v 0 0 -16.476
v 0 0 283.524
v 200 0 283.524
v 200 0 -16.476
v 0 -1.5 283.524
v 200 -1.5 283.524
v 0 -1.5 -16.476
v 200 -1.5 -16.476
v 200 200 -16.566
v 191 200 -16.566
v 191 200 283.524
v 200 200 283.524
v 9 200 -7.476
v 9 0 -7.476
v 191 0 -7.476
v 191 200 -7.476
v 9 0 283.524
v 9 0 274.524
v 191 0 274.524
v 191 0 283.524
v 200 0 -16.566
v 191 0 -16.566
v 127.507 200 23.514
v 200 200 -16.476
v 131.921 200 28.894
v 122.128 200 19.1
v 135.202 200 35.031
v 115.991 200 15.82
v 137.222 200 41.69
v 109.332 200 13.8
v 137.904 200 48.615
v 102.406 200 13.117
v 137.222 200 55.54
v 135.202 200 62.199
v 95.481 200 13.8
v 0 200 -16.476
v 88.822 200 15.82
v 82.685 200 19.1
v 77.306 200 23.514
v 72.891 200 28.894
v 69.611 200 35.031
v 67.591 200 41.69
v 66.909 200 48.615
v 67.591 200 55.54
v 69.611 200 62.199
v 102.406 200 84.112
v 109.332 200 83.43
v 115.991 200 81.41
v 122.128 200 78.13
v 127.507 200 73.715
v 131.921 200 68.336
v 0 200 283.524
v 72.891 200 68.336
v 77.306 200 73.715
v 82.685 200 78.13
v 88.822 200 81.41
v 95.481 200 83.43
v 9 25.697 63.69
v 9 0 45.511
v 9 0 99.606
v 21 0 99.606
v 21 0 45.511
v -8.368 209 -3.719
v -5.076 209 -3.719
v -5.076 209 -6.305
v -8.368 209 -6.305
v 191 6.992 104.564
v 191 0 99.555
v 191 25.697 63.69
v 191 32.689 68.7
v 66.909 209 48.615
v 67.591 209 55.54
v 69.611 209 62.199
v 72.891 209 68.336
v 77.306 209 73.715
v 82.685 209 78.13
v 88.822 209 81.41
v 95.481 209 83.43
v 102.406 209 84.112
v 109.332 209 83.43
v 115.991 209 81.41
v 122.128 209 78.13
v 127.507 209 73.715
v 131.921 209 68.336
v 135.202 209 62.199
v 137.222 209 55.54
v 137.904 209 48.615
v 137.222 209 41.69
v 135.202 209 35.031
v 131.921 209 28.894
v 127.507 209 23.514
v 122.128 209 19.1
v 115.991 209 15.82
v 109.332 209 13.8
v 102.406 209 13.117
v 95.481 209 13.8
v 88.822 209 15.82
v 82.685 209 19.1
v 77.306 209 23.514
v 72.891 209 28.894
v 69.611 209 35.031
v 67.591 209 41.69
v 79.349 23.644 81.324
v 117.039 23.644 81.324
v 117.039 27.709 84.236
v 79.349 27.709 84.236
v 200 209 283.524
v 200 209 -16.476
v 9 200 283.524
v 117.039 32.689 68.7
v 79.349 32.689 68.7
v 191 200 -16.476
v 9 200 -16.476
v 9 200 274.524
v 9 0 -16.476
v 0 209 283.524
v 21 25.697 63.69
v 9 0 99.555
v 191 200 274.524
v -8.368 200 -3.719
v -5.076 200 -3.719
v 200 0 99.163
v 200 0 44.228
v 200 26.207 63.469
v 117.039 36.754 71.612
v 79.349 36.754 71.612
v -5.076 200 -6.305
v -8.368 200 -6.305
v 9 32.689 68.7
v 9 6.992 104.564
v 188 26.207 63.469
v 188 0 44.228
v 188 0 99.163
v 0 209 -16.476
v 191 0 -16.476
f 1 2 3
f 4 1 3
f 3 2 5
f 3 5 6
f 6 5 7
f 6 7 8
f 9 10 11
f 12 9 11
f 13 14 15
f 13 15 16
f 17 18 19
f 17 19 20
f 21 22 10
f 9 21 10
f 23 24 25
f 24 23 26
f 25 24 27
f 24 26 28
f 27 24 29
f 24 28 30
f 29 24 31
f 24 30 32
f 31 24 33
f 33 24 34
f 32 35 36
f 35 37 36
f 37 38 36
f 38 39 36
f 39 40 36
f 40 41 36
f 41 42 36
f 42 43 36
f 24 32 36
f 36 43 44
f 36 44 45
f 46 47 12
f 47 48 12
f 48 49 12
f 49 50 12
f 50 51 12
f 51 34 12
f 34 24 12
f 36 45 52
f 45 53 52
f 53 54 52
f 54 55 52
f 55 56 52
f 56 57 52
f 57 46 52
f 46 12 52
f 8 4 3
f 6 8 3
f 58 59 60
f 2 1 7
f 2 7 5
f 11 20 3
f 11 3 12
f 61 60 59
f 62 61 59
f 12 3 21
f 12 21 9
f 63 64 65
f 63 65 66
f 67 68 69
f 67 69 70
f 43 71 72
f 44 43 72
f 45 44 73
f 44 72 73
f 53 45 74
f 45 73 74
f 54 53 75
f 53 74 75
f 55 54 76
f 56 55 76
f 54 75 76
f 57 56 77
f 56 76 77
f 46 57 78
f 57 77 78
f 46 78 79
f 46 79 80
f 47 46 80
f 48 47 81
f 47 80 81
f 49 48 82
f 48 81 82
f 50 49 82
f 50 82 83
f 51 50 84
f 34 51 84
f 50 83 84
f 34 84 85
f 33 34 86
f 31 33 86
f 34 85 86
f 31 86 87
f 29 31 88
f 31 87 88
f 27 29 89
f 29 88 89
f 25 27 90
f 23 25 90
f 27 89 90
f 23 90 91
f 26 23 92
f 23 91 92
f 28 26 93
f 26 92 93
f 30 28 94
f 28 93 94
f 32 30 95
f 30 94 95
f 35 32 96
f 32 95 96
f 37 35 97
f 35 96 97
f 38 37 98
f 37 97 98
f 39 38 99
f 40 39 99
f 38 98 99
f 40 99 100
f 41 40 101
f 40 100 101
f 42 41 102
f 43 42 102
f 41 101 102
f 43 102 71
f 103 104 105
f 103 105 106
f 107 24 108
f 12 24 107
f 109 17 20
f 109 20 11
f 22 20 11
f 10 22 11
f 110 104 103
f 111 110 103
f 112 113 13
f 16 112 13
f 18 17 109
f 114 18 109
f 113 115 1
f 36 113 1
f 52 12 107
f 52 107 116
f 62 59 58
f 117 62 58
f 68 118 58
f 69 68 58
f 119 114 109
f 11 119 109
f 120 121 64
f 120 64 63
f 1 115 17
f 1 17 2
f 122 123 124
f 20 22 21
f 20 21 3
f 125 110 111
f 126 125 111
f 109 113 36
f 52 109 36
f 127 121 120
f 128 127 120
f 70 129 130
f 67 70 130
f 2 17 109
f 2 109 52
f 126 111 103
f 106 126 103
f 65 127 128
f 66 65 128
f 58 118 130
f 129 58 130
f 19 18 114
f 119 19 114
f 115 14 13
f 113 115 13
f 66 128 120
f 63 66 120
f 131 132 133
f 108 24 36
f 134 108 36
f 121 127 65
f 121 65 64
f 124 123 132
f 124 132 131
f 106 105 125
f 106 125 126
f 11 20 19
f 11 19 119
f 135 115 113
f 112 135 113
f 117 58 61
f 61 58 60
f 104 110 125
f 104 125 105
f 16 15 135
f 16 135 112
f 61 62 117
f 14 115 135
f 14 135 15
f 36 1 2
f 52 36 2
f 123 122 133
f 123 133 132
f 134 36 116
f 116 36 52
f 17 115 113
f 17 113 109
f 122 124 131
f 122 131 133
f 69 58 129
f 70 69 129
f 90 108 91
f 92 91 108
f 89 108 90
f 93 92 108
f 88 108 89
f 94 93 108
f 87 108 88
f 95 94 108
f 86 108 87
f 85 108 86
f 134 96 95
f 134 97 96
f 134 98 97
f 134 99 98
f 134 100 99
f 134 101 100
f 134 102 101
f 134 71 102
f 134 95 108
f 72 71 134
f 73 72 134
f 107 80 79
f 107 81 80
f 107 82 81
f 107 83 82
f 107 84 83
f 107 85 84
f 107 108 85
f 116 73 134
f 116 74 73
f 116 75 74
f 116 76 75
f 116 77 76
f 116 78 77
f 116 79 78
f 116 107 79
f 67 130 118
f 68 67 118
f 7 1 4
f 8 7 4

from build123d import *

# Parameters (mm, degrees)
F0_W      = 200
F0_H      = 300
F1_DEPTH  = 1.5
F2_W      = 9
F2_H      = 300
F3_DEPTH  = 200
F5_DEPTH  = 12
F7_DEPTH  = 182
F8_W      = 37.689343
F8_H      = 15.529495
F9_DEPTH  = 5
F10_W     = 200
F10_H     = 9
F11_DEPTH = 182
F12_W     = 200
F12_H     = 9
F13_DEPTH = 182
F14_W     = 200
F14_H     = 300.089557
F15_DEPTH = 9
F16_W     = 200
F16_H     = 300
F16_W_2   = 3.292107
F16_H_2   = 2.586657
F17_DEPTH = 9
F18_R     = 35.497254
F19_DEPTH = 9
F21_DEPTH = 12


with BuildPart() as f1:
    # F0 (on Front) → F1 (new body)
    with BuildSketch(Plane.XZ):
        with Locations((100, 133.523875)):
            Rectangle(F0_W, F0_H)
    extrude(amount=F1_DEPTH)


with BuildPart() as f3:
    # F2 (on face) → F3 (new body)
    with BuildSketch(Plane(origin=(0, 0, 0), x_dir=(-1, 0, 0), z_dir=(0, 1, 0))):
        with Locations((-4.5, 133.523875)):
            Rectangle(F2_W, F2_H)
    extrude(amount=F3_DEPTH)


with BuildPart() as f5:
    # F4 (on face) → F5 (new body)
    with BuildSketch(Plane.YZ.offset(9)):
        Polygon((25.697459, 63.690469), (0, 99.606201), (0, 45.510899), align=None)
    extrude(amount=F5_DEPTH)


with BuildPart() as f7:
    # F6 (on face) → F7 (new body)
    with BuildSketch(Plane.YZ.offset(9)):
        Polygon((0, 99.554576), (25.697459, 63.690469), (32.689184, 68.700201), (6.991726, 104.564308), align=None)
    extrude(amount=F7_DEPTH)


with BuildPart() as f9:
    # F8 (on face) → F9 (new body)
    with BuildSketch(Plane(origin=(0, 54.125926, 38.782472), x_dir=(-1, 0, 0), z_dir=(0, 0.812872, 0.582442))):
        with Locations((-98.194032, 44.569699)):
            Rectangle(F8_W, F8_H)
    extrude(amount=F9_DEPTH)


with BuildPart() as f11:
    # F10 (on face) → F11 (new body)
    with BuildSketch(Plane.YZ.offset(9)):
        with Locations((100, 279.023875)):
            Rectangle(F10_W, F10_H)
    extrude(amount=F11_DEPTH)


with BuildPart() as f13:
    # F12 (on face) → F13 (new body)
    with BuildSketch(Plane.YZ.offset(9)):
        with Locations((100, -11.976125)):
            Rectangle(F12_W, F12_H)
    extrude(amount=F13_DEPTH)


with BuildPart() as f15:
    # F14 (on face) → F15 (new body)
    with BuildSketch(Plane.YZ.offset(191)):
        with Locations((100, 133.479096)):
            Rectangle(F14_W, F14_H)
    extrude(amount=F15_DEPTH)


with BuildPart() as f17:
    # F16 (on face) → F17 (new body)
    with BuildSketch(Plane(origin=(0, 200, 0), x_dir=(-1, 0, 0), z_dir=(0, 1, 0))):
        with Locations((-100, 133.523875)):
            Rectangle(F16_W, F16_H)
        with Locations((6.722217, -5.011967)):
            Rectangle(F16_W_2, F16_H_2)
    extrude(amount=F17_DEPTH)

    # F18 (on face) → F19 (cut)
    with BuildSketch(Plane(origin=(0, 209, 0), x_dir=(-1, 0, 0), z_dir=(0, 1, 0))):
        with Locations((-102.406368, 48.614729)):
            Circle(F18_R)
    extrude(amount=-F19_DEPTH, mode=Mode.SUBTRACT)


with BuildPart() as f21:
    # F20 (on face) → F21 (new body)
    with BuildSketch(Plane.YZ.offset(200)):
        Polygon((26.206825, 63.468762), (0, 99.162795), (0, 44.227516), align=None)
    extrude(amount=-F21_DEPTH)


solid = Compound([f1.part, f3.part, f5.part, f7.part, f9.part, f11.part, f13.part, f15.part, f17.part, f21.part])
